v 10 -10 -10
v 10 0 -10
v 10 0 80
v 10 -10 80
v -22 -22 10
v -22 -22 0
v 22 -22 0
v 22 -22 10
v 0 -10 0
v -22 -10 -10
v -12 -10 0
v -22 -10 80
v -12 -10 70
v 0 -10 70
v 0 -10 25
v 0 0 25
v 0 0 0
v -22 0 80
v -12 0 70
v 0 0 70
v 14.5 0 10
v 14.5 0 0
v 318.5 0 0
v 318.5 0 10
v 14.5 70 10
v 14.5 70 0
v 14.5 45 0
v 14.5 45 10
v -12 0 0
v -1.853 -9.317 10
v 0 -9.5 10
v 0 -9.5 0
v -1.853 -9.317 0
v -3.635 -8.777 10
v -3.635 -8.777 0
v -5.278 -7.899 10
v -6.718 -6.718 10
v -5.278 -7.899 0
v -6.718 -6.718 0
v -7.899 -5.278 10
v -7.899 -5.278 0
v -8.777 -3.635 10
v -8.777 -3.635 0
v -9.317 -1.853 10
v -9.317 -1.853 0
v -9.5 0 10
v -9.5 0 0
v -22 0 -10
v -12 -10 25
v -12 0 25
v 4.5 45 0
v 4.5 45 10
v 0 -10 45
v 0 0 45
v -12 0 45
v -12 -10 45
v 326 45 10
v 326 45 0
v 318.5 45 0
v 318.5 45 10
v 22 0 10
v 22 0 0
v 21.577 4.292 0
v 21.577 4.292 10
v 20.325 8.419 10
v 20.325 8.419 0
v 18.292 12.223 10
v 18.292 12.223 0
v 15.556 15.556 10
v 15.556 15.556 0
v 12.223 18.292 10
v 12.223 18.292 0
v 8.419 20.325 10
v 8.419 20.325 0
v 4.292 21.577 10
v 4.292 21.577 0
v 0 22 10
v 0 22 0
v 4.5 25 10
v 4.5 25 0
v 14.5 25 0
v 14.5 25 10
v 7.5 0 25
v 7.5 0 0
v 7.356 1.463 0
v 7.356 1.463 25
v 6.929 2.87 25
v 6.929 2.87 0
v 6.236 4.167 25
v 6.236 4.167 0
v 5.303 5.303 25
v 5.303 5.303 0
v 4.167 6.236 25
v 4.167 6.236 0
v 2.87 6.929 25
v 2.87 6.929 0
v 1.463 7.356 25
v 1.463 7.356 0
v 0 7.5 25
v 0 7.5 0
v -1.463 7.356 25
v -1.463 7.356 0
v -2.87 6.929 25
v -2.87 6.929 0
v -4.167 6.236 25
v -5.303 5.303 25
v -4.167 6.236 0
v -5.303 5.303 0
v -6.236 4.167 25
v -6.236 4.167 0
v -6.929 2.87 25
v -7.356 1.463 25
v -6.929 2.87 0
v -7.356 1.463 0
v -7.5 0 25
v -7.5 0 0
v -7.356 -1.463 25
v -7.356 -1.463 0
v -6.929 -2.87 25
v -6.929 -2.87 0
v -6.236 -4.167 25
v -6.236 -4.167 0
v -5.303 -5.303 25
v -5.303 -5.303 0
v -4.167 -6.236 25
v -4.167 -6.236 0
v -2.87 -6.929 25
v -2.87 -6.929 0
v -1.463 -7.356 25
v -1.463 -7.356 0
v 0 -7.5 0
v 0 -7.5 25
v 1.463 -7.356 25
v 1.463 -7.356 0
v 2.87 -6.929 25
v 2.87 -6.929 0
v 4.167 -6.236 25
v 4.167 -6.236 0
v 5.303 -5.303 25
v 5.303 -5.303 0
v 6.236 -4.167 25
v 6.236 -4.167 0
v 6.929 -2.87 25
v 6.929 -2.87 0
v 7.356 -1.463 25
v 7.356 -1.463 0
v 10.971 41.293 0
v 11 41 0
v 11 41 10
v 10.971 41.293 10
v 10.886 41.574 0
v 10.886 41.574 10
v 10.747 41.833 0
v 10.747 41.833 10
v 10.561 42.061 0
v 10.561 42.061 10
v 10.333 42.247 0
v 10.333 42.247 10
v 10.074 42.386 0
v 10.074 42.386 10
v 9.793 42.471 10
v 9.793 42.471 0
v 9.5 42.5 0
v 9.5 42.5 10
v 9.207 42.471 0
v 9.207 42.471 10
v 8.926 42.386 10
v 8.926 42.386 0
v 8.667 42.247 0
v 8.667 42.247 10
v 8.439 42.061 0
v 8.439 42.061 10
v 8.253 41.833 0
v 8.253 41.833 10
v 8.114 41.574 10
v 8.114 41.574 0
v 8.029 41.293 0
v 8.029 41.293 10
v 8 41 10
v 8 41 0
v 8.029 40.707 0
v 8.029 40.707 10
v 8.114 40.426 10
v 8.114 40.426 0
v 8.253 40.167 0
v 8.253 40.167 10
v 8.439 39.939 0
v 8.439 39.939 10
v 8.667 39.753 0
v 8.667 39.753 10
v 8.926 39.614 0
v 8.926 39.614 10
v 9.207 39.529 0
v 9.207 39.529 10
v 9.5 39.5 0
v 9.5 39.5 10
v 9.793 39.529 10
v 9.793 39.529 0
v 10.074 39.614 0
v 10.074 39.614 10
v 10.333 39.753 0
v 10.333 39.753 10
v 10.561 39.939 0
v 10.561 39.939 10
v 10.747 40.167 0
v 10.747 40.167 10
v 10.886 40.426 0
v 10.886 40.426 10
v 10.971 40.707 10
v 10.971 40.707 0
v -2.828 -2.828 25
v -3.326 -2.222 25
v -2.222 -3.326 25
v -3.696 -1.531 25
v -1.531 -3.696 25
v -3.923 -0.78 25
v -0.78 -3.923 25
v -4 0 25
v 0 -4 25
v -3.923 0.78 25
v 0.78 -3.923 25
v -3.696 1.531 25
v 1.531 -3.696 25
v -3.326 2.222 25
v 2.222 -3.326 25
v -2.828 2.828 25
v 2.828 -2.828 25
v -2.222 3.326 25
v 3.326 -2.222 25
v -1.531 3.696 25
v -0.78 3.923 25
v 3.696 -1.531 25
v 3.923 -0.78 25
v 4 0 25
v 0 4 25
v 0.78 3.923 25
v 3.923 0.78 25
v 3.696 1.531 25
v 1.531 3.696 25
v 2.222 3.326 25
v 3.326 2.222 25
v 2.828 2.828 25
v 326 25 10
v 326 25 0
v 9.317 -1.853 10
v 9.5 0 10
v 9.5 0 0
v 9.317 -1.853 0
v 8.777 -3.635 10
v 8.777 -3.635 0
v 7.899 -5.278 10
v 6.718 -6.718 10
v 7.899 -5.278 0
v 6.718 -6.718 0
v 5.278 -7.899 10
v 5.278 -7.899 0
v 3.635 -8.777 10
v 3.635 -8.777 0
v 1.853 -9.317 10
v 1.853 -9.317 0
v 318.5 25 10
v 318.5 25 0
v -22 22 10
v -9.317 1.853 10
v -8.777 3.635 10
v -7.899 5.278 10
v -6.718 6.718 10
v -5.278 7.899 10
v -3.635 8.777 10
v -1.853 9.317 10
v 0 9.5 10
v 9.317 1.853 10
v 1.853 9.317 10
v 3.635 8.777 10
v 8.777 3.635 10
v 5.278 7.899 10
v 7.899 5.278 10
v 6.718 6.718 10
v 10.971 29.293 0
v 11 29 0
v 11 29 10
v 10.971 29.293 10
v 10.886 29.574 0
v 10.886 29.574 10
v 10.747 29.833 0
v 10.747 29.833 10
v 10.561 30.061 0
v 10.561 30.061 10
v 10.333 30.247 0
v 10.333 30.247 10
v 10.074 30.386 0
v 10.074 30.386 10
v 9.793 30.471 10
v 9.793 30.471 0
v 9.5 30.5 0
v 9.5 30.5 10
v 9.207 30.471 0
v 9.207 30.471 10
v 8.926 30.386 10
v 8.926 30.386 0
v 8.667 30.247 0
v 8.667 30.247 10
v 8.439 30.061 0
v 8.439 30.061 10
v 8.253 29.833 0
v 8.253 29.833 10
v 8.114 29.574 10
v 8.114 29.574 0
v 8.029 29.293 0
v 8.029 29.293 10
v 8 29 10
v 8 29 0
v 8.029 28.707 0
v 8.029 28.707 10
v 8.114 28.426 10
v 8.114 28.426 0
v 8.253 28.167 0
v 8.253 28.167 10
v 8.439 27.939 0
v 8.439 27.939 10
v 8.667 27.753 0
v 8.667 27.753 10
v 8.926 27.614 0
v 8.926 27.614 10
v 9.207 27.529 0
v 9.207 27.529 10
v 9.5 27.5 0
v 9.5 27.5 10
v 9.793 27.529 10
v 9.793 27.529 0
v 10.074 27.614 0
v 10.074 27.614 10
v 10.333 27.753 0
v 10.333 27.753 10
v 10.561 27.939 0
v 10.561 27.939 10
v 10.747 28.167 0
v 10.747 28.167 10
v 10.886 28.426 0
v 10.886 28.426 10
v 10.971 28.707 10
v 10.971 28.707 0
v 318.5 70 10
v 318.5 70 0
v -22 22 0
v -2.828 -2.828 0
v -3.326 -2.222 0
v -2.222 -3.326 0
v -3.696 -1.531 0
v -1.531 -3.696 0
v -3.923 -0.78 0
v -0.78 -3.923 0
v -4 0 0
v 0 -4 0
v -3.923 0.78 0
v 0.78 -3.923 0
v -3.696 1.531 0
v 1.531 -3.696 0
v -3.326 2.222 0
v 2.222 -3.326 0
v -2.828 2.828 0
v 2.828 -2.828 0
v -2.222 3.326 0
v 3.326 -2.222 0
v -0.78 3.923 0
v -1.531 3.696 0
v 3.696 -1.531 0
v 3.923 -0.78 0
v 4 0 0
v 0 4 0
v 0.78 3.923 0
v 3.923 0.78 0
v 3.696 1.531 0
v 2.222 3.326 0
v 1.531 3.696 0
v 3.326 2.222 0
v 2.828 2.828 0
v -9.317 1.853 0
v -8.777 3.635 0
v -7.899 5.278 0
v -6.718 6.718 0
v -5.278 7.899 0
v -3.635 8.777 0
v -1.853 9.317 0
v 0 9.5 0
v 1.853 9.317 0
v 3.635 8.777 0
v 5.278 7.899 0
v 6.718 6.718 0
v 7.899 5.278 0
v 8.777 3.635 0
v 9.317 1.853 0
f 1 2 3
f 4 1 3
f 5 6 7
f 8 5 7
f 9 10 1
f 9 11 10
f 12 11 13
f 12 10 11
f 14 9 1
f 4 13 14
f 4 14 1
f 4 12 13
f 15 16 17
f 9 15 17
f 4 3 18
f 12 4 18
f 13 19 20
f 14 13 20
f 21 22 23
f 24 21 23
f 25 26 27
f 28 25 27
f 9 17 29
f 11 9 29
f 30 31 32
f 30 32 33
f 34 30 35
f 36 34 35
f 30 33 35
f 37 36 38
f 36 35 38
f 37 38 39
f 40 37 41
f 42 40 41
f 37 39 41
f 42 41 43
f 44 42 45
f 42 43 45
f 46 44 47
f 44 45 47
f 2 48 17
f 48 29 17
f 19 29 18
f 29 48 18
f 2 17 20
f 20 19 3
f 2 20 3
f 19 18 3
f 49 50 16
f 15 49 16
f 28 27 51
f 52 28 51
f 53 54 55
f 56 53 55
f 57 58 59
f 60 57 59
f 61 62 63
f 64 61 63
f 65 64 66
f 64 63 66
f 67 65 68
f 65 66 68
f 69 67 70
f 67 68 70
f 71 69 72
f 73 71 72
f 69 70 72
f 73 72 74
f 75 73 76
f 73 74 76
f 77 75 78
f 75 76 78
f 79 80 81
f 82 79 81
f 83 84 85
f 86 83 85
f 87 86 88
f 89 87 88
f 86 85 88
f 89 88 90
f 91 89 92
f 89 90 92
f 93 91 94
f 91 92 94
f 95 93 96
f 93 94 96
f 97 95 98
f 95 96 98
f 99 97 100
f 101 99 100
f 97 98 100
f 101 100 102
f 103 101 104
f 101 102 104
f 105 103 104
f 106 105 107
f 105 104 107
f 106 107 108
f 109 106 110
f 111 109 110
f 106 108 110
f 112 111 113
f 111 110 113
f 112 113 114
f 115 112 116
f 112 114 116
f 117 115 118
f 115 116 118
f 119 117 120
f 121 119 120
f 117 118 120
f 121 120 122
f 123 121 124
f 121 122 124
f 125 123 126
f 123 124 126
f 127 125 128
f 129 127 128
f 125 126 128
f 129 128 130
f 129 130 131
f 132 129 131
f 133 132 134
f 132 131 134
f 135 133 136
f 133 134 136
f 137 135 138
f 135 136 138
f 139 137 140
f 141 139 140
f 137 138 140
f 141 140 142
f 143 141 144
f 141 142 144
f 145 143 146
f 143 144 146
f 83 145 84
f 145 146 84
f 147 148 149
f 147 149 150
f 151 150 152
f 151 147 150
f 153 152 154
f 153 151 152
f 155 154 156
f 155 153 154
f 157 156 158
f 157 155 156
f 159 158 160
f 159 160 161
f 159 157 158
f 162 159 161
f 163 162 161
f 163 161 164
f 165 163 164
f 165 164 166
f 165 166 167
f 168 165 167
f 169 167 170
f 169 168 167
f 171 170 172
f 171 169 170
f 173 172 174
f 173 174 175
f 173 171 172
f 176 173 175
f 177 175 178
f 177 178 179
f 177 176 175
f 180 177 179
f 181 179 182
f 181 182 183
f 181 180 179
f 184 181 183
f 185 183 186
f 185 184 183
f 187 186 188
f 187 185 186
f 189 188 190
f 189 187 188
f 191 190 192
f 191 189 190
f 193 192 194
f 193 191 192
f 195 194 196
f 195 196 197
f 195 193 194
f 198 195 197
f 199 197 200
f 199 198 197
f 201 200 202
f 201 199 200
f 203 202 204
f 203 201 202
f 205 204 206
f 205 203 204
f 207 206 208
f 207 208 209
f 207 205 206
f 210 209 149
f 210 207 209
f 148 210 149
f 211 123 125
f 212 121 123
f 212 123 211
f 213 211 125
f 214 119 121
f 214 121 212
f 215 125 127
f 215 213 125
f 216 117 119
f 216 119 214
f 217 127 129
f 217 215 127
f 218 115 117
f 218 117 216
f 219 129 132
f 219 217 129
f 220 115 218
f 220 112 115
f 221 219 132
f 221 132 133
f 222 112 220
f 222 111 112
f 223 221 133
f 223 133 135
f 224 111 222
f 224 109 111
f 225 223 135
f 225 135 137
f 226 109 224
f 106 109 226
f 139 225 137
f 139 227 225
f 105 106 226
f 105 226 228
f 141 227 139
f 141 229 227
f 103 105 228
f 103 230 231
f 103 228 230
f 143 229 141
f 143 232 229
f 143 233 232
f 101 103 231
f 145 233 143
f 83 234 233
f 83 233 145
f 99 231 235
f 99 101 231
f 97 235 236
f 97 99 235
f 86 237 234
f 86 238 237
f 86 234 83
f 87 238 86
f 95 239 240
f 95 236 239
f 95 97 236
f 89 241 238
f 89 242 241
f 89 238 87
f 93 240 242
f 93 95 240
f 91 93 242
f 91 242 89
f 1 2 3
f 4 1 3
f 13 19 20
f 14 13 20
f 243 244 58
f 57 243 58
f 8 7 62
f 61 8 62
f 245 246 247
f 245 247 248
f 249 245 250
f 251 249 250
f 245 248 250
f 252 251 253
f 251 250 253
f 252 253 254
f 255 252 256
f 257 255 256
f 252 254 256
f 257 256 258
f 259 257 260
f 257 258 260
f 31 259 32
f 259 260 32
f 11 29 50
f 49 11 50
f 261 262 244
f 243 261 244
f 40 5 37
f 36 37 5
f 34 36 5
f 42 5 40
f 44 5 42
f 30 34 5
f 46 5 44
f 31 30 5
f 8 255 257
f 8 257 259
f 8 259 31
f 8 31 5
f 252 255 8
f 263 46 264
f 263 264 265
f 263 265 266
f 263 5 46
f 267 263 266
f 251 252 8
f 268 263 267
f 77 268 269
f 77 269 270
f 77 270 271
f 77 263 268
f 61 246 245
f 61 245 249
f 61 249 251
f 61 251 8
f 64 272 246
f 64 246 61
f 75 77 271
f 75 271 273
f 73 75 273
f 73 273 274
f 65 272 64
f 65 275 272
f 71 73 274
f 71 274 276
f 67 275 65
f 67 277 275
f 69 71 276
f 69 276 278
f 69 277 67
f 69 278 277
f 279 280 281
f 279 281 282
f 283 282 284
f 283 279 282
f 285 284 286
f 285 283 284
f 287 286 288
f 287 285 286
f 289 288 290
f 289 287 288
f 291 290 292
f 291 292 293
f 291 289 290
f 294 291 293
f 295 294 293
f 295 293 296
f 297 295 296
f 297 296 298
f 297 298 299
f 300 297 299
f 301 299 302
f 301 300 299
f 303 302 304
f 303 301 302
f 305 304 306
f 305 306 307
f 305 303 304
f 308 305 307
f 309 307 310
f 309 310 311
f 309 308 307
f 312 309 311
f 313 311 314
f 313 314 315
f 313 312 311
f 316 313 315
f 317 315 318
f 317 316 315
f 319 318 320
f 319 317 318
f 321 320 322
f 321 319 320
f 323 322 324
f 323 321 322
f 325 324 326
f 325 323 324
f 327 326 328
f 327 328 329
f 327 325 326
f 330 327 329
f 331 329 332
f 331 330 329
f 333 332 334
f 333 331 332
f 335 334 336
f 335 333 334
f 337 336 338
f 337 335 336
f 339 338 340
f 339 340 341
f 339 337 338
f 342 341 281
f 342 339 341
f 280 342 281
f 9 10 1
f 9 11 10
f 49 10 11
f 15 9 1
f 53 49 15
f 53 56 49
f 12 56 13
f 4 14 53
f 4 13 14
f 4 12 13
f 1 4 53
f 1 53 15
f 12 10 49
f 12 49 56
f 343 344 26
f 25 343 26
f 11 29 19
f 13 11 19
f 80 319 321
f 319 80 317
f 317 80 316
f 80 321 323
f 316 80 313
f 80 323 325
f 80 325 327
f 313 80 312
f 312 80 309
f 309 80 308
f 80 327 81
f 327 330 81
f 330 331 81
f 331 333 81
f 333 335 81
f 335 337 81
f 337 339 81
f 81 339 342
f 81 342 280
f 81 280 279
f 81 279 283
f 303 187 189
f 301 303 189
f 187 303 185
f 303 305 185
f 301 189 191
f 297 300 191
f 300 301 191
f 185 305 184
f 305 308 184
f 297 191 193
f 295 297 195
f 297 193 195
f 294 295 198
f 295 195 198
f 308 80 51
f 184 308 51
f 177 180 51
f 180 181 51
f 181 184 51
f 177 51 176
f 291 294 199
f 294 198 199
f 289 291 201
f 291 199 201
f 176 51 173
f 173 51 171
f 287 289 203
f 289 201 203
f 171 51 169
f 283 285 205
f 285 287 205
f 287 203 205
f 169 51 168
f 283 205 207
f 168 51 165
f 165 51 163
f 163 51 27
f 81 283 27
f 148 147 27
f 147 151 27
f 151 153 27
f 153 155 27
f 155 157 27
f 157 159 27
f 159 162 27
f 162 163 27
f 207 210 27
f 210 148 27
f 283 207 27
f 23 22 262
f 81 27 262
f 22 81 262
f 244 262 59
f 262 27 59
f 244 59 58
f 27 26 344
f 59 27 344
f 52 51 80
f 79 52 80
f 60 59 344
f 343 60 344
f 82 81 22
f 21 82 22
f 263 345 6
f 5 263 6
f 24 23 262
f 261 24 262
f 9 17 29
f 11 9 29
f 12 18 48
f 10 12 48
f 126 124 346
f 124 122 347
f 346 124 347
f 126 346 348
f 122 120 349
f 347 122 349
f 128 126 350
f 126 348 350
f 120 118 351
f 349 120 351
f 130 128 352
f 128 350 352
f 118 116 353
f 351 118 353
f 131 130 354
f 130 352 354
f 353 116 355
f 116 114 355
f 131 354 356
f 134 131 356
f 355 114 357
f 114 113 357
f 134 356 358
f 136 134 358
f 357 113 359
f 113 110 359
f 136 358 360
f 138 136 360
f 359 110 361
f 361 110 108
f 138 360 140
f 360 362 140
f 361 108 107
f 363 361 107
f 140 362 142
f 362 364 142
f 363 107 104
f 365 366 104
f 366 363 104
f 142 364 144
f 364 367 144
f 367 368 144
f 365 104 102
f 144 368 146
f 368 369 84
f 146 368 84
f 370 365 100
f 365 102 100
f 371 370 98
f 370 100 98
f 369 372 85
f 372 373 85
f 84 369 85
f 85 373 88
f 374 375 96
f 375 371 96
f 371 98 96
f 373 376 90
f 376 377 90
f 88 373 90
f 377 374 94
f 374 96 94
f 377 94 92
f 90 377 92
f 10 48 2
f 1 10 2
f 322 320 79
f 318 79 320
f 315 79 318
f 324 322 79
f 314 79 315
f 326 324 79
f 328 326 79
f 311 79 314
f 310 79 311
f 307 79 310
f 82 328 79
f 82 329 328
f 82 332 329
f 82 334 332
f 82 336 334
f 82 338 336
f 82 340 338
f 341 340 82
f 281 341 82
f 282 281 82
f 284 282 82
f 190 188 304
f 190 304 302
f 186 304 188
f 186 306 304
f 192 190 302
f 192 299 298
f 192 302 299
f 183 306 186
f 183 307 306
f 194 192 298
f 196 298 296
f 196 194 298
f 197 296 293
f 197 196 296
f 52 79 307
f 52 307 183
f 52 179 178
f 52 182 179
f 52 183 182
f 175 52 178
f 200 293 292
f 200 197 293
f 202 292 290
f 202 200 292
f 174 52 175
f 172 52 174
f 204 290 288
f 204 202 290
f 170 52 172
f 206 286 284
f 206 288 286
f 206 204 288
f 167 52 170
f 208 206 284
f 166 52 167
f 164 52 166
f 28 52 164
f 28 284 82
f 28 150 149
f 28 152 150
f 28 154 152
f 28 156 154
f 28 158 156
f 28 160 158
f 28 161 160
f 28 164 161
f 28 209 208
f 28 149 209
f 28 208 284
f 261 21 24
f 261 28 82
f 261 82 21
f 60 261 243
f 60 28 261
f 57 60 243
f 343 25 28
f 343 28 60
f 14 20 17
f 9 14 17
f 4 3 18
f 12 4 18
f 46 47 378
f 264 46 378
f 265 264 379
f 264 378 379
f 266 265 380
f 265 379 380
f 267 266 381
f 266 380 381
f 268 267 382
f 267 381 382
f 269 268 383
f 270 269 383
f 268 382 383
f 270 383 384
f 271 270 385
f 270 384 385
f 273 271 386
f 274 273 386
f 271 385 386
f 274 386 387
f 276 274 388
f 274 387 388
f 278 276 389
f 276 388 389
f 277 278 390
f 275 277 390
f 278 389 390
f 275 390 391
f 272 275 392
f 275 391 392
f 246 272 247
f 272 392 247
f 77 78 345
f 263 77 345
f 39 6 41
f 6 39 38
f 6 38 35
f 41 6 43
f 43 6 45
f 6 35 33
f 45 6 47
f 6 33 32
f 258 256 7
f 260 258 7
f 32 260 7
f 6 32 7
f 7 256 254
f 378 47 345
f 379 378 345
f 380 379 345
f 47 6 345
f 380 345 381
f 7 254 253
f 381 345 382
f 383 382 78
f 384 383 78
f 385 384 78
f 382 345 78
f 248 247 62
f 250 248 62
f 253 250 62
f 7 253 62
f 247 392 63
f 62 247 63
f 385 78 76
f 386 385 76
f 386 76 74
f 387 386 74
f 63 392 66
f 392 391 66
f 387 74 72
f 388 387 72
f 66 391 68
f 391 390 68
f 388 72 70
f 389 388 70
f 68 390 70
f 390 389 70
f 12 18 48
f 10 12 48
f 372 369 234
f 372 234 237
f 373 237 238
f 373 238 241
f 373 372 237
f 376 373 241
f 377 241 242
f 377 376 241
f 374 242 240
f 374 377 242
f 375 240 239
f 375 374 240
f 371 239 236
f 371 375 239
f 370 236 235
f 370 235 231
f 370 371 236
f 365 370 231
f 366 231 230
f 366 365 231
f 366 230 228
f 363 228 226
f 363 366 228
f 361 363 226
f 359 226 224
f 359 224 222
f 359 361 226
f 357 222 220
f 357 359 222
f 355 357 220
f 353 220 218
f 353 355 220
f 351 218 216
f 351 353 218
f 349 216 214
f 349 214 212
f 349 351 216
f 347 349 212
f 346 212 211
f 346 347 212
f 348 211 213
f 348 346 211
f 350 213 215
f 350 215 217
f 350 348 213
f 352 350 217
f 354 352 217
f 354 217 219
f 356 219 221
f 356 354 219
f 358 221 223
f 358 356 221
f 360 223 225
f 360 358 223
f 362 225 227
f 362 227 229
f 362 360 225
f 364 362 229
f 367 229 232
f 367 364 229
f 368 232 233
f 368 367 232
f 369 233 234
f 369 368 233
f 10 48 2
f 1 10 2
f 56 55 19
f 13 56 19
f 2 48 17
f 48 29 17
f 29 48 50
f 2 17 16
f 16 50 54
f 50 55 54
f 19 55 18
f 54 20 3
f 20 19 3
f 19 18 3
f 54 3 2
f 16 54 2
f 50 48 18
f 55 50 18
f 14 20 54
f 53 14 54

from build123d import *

# Parameters (mm, degrees)
F1_DEPTH = 10
F2_R     = 1.5
F3_DEPTH = 10
F4_R     = 7.5
F4_R_2   = 4
F5_DEPTH = 25
F7_DEPTH = 10
F8_DEPTH = 10


with BuildPart() as f1:
    # F0 (on Top) → F1 (new body)
    with BuildSketch(Plane.XY):
        with BuildLine():
            ThreePointArc((0, -9.5), (-6.717514, -6.717514), (-9.5, 0))
            Line((-9.5, 0), (-22, 0))
            Line((-22, 0), (-22, -22))
            Line((-22, -22), (0, -22))
            Line((0, -22), (0, -9.5))
        make_face()
        with BuildLine():
            ThreePointArc((-9.5, 0), (0, 9.5), (9.5, 0))
            ThreePointArc((9.5, 0), (6.717514, -6.717514), (0, -9.5))
            Line((0, -9.5), (0, -22))
            Line((0, -22), (22, -22))
            Line((22, -22), (22, 0))
            ThreePointArc((22, 0), (15.556349, 15.556349), (0, 22))
            Line((0, 22), (-22, 22))
            Line((-22, 22), (-22, 0))
            Line((-22, 0), (-9.5, 0))
        make_face()
    extrude(amount=F1_DEPTH)


with BuildPart() as f3:
    # F2 (on Top) → F3 (new body)
    with BuildSketch(Plane.XY):
        Polygon((14.5, 25), (14.5, 0), (318.5, 0), (318.5, 25), (326, 25), (326, 45), (318.5, 45), (318.5, 70), (14.5, 70), (14.5, 45), (14.5, 41), (14.5, 29), align=None)
        Polygon((4.5, 25), (14.5, 25), (14.5, 29), (14.5, 41), (14.5, 45), (4.5, 45), align=None)
        with Locations((9.5, 29)):
            Circle(F2_R, mode=Mode.SUBTRACT)
        with Locations((9.5, 41)):
            Circle(F2_R, mode=Mode.SUBTRACT)
    extrude(amount=F3_DEPTH)


with BuildPart() as f5:
    # F4 (on Top) → F5 (new body)
    with BuildSketch(Plane.XY):
        Circle(F4_R)
        Circle(F4_R_2, mode=Mode.SUBTRACT)
    extrude(amount=F5_DEPTH)


with BuildPart() as f7:
    # F6 (on Front) → F7 (new body)
    with BuildSketch(Plane.XZ):
        Polygon((10, -10), (10, 0), (10, 80), (-22, 80), (-22, -10), align=None)
        Polygon((0, 25), (0, 0), (-12, 0), (-12, 25), (-12, 45), (-12, 70), (0, 70), (0, 45), align=None, mode=Mode.SUBTRACT)
        Polygon((-6, 25), (0, 25), (0, 45), (-12, 45), (-12, 25), align=None)
    extrude(amount=F7_DEPTH)


with BuildPart() as f8:
    # F6 (on Front) → F8 (new body)
    with BuildSketch(Plane.XZ):
        Polygon((10, -10), (10, 0), (10, 80), (-22, 80), (-22, -10), align=None)
        Polygon((0, 25), (0, 0), (-12, 0), (-12, 25), (-12, 45), (-12, 70), (0, 70), (0, 45), align=None, mode=Mode.SUBTRACT)
    extrude(amount=F8_DEPTH)


solid = Compound([f1.part, f3.part, f5.part, f7.part, f8.part])
